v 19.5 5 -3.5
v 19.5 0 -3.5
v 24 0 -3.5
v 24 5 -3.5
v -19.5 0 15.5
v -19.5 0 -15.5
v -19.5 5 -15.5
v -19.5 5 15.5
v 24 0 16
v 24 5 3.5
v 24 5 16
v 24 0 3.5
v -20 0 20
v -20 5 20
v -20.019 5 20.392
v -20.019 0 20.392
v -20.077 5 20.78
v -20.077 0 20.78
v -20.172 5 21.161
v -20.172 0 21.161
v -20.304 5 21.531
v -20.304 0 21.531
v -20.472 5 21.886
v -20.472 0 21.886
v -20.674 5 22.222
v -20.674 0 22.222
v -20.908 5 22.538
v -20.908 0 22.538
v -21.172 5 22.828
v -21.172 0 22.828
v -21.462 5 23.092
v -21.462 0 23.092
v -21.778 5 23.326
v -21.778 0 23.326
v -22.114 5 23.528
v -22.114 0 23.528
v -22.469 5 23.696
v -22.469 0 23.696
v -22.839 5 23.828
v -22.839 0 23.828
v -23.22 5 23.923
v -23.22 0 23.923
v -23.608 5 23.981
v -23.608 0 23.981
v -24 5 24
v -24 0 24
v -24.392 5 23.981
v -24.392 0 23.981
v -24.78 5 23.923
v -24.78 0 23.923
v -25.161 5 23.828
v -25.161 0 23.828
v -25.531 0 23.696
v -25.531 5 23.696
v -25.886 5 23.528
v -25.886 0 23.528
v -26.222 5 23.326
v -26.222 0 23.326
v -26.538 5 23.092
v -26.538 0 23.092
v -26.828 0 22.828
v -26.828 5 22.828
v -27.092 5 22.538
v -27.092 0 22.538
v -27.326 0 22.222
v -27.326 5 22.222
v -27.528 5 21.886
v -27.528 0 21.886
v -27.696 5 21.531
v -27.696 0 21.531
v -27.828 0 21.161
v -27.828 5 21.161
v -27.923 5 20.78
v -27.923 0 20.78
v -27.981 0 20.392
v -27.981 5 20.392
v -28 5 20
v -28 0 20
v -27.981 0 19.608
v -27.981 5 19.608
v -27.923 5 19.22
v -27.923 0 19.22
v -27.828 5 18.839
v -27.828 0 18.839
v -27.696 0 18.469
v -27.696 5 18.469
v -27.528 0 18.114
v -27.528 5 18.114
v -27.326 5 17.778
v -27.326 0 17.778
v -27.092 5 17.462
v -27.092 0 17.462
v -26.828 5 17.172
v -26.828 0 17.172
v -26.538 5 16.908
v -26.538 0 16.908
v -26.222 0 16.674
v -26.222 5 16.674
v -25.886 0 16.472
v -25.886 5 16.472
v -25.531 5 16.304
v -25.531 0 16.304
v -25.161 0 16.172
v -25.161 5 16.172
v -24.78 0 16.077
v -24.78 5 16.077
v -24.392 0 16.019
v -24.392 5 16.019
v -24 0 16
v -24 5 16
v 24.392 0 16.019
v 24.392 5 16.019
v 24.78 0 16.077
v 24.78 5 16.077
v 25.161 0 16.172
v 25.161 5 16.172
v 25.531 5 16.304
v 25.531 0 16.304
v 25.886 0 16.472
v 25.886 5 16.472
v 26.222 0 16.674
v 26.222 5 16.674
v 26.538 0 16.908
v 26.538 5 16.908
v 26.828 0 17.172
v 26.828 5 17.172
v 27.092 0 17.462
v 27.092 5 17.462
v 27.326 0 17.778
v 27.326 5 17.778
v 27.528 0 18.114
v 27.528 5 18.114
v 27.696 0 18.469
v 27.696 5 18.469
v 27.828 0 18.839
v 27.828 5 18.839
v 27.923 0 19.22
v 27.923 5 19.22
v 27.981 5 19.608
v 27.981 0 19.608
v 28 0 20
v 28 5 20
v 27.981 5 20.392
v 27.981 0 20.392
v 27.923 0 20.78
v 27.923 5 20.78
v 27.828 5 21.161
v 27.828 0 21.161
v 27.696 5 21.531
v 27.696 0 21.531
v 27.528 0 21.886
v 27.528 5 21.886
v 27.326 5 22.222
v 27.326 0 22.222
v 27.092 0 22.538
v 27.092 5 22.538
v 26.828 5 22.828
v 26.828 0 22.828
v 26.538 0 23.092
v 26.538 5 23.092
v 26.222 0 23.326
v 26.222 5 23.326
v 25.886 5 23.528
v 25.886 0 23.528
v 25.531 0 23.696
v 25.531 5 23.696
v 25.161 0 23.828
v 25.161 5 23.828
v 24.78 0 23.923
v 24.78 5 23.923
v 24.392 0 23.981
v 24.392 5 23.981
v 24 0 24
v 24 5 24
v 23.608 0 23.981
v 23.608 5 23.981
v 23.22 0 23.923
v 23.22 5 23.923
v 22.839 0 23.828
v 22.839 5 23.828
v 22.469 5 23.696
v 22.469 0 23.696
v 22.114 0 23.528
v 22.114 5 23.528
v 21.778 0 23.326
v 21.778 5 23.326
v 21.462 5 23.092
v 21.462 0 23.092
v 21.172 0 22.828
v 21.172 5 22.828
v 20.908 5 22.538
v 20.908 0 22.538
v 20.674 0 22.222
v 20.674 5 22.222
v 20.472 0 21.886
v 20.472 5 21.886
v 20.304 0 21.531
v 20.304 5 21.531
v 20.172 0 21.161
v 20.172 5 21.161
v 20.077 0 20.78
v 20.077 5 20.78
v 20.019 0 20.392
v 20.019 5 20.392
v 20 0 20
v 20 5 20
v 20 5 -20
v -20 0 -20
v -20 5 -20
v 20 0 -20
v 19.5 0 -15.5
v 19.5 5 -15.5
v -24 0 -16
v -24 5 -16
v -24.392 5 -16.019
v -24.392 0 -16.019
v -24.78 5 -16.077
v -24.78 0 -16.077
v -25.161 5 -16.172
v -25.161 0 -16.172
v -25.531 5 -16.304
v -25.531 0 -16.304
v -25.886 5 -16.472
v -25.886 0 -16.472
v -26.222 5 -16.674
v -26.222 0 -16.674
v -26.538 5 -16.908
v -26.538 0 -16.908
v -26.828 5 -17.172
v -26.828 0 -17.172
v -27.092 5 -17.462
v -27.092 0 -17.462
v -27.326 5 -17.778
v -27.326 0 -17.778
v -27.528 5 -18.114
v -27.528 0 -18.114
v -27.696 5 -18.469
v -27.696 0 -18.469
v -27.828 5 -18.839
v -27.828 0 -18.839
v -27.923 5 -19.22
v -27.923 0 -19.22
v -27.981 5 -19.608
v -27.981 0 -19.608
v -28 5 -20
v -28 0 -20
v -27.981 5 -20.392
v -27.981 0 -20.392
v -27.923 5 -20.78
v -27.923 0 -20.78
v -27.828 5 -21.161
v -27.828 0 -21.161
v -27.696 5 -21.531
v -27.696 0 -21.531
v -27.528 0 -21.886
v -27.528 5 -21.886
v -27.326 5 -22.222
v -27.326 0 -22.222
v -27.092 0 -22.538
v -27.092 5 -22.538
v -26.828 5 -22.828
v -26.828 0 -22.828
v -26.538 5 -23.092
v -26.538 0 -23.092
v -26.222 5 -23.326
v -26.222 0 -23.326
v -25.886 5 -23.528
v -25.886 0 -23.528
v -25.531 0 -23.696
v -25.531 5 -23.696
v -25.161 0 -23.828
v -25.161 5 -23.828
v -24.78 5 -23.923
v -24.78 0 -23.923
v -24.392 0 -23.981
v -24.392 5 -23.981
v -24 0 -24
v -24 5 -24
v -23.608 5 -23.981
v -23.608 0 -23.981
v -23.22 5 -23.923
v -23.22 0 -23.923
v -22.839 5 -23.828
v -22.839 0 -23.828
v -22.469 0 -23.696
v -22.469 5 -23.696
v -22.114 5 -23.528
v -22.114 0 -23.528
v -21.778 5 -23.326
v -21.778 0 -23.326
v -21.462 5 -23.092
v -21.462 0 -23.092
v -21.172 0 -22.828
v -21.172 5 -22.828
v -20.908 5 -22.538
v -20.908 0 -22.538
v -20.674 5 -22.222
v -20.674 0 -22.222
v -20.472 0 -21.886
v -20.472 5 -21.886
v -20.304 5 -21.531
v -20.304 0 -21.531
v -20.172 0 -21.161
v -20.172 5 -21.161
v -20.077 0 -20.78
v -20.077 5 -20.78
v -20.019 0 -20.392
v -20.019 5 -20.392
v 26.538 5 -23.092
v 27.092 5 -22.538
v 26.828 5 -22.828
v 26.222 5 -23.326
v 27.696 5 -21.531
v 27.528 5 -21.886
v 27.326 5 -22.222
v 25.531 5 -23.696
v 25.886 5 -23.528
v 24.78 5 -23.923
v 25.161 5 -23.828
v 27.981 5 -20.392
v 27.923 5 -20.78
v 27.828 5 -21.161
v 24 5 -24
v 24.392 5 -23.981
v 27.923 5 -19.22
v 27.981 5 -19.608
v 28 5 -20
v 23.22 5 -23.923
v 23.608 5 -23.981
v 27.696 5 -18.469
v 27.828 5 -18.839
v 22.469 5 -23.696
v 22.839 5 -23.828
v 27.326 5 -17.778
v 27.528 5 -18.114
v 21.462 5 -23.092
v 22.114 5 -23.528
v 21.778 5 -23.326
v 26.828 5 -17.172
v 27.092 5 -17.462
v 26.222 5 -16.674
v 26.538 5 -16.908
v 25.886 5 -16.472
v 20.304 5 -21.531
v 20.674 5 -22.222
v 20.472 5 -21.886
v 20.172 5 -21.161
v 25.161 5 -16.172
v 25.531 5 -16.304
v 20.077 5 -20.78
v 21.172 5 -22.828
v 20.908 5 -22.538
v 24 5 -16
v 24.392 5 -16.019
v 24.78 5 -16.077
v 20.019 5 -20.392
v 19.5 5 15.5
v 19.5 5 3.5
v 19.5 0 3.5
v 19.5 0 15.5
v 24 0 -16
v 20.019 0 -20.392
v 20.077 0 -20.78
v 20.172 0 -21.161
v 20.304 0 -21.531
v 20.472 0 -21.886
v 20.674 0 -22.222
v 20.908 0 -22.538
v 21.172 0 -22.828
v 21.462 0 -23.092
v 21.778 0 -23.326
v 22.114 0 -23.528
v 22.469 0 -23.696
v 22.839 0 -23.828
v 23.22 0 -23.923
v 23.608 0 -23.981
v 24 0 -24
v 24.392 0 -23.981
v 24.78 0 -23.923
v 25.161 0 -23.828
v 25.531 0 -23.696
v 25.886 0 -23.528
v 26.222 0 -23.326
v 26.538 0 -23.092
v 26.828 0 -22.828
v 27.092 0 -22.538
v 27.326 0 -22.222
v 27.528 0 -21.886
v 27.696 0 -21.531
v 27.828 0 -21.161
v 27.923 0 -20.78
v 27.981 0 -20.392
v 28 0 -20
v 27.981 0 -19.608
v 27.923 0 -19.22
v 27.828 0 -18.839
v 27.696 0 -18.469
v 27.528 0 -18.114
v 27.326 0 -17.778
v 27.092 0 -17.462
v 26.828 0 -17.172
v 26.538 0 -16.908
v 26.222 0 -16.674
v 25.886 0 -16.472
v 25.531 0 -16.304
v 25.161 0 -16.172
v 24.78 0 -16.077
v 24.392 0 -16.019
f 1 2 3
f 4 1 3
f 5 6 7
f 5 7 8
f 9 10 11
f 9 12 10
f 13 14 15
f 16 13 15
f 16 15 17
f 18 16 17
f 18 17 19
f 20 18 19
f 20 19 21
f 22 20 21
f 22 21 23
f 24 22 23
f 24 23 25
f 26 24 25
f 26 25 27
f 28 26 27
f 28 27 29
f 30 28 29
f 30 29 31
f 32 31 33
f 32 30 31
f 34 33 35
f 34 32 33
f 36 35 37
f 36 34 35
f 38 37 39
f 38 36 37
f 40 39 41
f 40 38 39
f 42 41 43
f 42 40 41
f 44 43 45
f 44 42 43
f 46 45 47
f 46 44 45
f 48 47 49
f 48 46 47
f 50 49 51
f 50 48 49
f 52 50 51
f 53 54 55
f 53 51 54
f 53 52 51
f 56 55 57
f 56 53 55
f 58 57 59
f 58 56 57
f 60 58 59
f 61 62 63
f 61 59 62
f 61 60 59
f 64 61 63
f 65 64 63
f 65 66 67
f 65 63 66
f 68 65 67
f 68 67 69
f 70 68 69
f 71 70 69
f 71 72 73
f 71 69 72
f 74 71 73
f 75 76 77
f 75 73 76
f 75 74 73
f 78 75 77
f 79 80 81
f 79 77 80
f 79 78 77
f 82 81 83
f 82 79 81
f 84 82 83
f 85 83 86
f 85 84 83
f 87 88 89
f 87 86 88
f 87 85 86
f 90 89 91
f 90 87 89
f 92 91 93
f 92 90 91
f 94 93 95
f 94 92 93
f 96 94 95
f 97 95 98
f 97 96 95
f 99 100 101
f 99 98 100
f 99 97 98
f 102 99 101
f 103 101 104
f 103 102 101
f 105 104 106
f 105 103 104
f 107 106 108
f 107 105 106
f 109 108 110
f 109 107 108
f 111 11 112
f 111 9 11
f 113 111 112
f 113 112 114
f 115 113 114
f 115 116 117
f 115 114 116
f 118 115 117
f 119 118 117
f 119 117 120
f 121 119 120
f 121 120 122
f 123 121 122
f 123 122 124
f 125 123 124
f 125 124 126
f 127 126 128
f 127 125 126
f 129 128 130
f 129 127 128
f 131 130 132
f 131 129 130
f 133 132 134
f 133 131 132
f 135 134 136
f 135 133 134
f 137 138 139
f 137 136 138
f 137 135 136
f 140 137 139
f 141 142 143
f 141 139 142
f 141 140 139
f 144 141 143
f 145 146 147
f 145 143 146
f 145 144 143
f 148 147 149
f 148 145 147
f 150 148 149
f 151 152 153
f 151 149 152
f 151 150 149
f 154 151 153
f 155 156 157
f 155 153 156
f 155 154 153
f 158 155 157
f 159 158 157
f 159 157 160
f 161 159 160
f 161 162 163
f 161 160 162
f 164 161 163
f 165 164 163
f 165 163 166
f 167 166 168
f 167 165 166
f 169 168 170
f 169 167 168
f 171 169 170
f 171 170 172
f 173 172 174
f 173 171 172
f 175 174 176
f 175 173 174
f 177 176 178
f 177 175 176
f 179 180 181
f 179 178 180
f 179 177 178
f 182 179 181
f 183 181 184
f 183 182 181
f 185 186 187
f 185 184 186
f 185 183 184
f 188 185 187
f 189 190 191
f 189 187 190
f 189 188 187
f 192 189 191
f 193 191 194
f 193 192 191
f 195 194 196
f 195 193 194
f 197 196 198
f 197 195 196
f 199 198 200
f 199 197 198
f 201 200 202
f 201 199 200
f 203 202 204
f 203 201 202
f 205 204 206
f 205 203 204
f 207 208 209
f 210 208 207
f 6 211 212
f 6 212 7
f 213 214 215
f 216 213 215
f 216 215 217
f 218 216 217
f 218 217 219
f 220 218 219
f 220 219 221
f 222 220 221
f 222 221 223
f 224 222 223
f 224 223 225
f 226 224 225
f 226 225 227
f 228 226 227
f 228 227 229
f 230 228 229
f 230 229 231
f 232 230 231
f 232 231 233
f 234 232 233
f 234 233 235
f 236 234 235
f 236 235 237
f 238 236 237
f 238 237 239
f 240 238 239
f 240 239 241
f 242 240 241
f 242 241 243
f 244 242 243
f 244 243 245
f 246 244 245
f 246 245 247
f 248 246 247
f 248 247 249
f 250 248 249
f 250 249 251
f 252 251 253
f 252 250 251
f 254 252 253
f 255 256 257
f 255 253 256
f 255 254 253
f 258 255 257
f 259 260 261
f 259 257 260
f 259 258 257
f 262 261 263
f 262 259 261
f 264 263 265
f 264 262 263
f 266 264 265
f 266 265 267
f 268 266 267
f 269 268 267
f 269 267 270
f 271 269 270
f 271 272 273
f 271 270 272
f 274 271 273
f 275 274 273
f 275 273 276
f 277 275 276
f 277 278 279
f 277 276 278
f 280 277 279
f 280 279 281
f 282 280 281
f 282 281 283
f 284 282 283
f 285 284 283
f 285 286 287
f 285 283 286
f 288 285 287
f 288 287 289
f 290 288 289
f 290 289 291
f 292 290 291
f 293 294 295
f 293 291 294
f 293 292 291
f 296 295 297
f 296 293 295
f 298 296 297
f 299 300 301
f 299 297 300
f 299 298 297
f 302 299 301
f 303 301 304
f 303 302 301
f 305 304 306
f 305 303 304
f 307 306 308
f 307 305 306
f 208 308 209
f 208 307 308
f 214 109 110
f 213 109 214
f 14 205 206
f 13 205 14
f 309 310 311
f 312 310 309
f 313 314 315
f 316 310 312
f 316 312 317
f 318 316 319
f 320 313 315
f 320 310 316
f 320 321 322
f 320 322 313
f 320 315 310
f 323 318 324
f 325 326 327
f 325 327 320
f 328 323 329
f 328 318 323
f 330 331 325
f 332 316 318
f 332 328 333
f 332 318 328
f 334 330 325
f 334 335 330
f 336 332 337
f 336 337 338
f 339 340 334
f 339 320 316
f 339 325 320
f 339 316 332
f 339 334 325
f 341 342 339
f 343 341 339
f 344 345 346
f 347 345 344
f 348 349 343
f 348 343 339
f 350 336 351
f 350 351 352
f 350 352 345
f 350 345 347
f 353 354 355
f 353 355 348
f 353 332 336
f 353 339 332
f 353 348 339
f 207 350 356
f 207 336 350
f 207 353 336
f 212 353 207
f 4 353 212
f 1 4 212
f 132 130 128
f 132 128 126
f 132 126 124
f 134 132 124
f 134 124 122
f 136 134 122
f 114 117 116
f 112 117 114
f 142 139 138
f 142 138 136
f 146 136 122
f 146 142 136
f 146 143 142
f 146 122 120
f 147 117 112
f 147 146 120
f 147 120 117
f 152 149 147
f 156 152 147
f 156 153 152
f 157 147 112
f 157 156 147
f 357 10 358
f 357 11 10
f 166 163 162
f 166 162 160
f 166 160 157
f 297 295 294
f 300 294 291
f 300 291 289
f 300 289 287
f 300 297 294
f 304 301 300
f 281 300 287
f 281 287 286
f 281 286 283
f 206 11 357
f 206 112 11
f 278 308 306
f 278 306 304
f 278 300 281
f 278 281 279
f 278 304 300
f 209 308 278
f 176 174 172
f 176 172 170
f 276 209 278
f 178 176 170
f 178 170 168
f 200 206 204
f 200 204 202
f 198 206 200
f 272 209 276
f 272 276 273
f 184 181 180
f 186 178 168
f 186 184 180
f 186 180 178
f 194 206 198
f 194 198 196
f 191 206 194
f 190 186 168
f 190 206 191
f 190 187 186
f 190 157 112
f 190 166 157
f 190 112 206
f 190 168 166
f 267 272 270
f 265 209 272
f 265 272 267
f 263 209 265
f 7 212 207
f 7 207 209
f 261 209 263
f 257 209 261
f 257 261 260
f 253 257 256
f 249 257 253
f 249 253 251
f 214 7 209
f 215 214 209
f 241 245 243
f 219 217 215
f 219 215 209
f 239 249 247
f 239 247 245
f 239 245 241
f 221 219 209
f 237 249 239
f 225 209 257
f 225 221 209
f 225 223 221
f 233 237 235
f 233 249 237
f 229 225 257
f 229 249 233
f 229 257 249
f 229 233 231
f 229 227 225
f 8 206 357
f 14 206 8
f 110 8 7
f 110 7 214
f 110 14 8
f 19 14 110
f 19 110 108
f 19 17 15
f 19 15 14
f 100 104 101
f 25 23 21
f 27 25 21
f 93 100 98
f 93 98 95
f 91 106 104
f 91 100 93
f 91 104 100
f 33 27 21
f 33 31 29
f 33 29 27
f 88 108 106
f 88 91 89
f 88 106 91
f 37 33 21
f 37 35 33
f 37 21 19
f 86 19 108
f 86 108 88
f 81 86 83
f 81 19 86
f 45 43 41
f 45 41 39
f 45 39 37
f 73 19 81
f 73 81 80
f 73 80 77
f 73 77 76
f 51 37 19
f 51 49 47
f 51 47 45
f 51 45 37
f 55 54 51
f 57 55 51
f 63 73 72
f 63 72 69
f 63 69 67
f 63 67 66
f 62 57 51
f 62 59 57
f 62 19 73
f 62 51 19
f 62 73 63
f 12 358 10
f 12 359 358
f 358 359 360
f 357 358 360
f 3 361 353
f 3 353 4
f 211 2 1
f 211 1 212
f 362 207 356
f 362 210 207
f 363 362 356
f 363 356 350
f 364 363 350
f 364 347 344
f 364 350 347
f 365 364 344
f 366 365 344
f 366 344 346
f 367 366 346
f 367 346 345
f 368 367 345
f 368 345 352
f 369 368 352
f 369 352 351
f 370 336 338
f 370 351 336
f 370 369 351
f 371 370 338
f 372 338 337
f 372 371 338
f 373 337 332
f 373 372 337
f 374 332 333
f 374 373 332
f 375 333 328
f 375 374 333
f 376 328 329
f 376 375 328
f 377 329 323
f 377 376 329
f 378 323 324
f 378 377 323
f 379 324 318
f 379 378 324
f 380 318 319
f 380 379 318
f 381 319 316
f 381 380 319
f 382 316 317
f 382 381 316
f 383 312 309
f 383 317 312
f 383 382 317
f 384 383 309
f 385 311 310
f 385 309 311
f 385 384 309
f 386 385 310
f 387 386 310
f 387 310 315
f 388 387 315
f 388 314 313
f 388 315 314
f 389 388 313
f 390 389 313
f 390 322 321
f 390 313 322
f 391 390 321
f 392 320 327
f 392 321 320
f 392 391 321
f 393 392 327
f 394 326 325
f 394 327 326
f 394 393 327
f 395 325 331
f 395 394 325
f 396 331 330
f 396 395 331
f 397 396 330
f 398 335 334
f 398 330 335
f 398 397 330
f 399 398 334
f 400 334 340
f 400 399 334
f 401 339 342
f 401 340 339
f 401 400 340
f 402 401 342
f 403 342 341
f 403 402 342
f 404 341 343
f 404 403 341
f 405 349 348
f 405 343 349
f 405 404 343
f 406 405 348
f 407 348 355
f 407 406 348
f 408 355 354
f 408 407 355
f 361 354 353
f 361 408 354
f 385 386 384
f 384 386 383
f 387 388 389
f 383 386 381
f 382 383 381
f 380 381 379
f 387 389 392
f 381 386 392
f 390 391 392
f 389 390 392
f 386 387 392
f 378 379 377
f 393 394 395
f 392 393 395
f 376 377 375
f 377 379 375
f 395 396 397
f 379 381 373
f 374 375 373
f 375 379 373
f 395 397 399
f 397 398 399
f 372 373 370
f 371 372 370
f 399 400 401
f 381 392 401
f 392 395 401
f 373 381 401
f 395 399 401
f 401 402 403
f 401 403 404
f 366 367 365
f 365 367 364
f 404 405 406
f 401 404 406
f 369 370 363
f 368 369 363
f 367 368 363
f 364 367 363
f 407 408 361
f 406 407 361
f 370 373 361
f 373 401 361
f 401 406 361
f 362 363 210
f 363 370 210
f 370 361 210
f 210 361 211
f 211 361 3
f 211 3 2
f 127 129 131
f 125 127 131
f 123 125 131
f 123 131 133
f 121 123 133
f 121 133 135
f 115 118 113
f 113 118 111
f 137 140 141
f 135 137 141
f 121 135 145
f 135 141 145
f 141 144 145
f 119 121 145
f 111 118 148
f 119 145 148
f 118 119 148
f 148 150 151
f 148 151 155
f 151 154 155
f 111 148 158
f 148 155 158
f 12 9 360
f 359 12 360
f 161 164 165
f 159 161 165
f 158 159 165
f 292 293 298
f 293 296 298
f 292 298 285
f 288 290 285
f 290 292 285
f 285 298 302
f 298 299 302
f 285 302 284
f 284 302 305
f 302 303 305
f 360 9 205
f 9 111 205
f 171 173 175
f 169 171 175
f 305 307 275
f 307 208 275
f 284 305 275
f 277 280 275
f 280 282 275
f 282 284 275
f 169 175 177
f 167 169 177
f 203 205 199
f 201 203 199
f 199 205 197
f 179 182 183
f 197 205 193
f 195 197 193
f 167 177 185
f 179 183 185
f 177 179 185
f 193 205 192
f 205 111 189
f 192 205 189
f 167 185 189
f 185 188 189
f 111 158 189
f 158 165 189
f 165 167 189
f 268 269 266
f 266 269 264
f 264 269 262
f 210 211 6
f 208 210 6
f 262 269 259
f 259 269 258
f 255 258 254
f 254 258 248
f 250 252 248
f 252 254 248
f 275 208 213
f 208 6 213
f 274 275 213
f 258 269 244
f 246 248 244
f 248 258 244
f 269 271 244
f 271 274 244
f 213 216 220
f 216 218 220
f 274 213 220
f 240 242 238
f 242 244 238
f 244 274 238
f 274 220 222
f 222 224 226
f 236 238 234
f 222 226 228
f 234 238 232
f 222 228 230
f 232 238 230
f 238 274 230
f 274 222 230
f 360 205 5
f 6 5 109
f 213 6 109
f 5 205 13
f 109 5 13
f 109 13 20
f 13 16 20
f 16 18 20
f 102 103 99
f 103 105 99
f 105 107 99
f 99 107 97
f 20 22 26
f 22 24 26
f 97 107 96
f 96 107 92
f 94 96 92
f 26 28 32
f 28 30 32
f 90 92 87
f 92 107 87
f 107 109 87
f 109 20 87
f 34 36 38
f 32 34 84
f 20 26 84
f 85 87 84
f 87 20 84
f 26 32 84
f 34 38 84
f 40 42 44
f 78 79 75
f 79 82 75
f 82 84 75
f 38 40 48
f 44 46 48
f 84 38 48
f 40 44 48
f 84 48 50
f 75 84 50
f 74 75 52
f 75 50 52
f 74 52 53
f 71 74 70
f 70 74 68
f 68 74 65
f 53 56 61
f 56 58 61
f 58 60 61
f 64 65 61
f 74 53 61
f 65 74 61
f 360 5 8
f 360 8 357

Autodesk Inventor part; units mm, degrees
ref_plane "YZ Plane" through (0, 0, 0) normal (1, 0, 0) x (0, 1, 0)
ref_plane "XZ Plane" through (0, 0, 0) normal (0, 1, 0) x (-1, 0, 0)
ref_plane "XY Plane" through (0, 0, 0) normal (0, 0, 1) x (1, 0, 0)
sketch "Sketch1" plane through (0, 0, 0) normal (0, 1, 0) x (-1, 0, 0)
  line L0 (19.5, 15.5) -> (-19.5, 15.5)
  line L1 (-19.5, -15.5) -> (19.5, -15.5)
  line L2 (19.5, -15.5) -> (19.5, 15.5)
  line L3 (24, -20) -> (-24, -20)
  line L4 (-24, 20) -> (24, 20)
  line L5 (24, 20) -> (24, -20)
  line L6 (-19.5, -3.5) -> (-24, -3.5)
  line L7 (-19.5, 3.5) -> (-24, 3.5)
  line L8 (-19.5, -3.5) -> (-19.5, -15.5)
  line L9 (-24, -20) -> (-24, -3.5)
  line L10 (-24, 3.5) -> (-24, 20)
  line L11 (-19.5, 3.5) -> (-19.5, 15.5)
  circle A0 centre (24, -20) radius 4
  circle A1 centre (24, 20) radius 4
  circle A2 centre (-24, 20) radius 4
  circle A3 centre (-24, -20) radius 4
  point P0 (0, 0)
  point P1 (0, -15.5)
  point P2 (19.5, 0)
  point P3 (0, 20)
  point P4 (24, 0)
  dimension "d0" = 39
  dimension "d1" = 31
  dimension "d2" = 4.5
  dimension "d25" = 4.5
  dimension "d27" = 4.5
  dimension "d28" = 16.5
  dimension "d29" = 8
  dimension "d30" = 8
  dimension "d31" = 8
  dimension "d32" = 8
extrude "Extrusion1" add sketch "Sketch1" along normal blind 5
sketch "Sketch2" plane through (0, 0, 0) normal (0, -1, 0) x (1, 0, 0)
  line L0 (-19.5, -15.5) -> (-19.5, 15.5) projected
  line L1 (-19.5, 15.5) -> (19.5, 15.5) projected
  line L2 (19.5, -15.5) -> (-19.5, -15.5) projected
  line L3 (24, -16) -> (24, -3.5) projected
  line L4 (20, 20) -> (-20, 20) projected
  line L5 (-24, 16) -> (-24, -16) projected
  line L6 (-20, -20) -> (20, -20) projected
  line L7 (19.5, -15.5) -> (-19.5, -15.5) construction
  line L8 (-40, 34) -> (40, 34) construction
  line L9 (40, 34) -> (40, -34) construction
  line L10 (40, -34) -> (-40, -34) construction
  line L11 (-40, -34) -> (-40, 34) construction
  line L12 (-40, 34) -> (-19.5, 15.5) construction
  line L13 (-40, -34) -> (-19.5, -15.5) construction
  line L14 (40, -34) -> (20, -15) construction
  line L15 (22, 18) -> (40, 34) construction
  line L16 (24, -3.5) -> (19.5, -3.5) projected
  line L17 (19.5, -3.5) -> (19.5, -15.5) projected
  line L18 (19.5, 3.5) -> (24, 3.5) projected
  line L19 (24, 3.5) -> (24, 16) projected
  line L20 (19.5, 15.5) -> (19.5, 3.5) projected
  arc A0 (-20, 20) -> (-24, 16) centre (-24, 20) ccw projected
  arc A1 (-24, -16) -> (-20, -20) centre (-24, -20) ccw projected
  arc A2 (20, -20) -> (24, -16) centre (24, -20) ccw projected
  arc A3 (24, 16) -> (20, 20) centre (24, 20) ccw projected
  point P0 (0, 0)
  point P1 (-40, 0)
  point P2 (0, 34)
  point P3 (-29.75, -24.75)
  point P4 (30, -24.5)
  point P5 (31, 26)
  point P6 (-29.75, 24.75)
  dimension "d14" = 54
  dimension "d15" = 64
hole "Hole1" [suppressed]
sketch "Sketch3" plane through (0, 0, 0) normal (0, -1, 0) x (1, 0, 0)
  point P0 (0, 0)
properties part number "cubierta2"
